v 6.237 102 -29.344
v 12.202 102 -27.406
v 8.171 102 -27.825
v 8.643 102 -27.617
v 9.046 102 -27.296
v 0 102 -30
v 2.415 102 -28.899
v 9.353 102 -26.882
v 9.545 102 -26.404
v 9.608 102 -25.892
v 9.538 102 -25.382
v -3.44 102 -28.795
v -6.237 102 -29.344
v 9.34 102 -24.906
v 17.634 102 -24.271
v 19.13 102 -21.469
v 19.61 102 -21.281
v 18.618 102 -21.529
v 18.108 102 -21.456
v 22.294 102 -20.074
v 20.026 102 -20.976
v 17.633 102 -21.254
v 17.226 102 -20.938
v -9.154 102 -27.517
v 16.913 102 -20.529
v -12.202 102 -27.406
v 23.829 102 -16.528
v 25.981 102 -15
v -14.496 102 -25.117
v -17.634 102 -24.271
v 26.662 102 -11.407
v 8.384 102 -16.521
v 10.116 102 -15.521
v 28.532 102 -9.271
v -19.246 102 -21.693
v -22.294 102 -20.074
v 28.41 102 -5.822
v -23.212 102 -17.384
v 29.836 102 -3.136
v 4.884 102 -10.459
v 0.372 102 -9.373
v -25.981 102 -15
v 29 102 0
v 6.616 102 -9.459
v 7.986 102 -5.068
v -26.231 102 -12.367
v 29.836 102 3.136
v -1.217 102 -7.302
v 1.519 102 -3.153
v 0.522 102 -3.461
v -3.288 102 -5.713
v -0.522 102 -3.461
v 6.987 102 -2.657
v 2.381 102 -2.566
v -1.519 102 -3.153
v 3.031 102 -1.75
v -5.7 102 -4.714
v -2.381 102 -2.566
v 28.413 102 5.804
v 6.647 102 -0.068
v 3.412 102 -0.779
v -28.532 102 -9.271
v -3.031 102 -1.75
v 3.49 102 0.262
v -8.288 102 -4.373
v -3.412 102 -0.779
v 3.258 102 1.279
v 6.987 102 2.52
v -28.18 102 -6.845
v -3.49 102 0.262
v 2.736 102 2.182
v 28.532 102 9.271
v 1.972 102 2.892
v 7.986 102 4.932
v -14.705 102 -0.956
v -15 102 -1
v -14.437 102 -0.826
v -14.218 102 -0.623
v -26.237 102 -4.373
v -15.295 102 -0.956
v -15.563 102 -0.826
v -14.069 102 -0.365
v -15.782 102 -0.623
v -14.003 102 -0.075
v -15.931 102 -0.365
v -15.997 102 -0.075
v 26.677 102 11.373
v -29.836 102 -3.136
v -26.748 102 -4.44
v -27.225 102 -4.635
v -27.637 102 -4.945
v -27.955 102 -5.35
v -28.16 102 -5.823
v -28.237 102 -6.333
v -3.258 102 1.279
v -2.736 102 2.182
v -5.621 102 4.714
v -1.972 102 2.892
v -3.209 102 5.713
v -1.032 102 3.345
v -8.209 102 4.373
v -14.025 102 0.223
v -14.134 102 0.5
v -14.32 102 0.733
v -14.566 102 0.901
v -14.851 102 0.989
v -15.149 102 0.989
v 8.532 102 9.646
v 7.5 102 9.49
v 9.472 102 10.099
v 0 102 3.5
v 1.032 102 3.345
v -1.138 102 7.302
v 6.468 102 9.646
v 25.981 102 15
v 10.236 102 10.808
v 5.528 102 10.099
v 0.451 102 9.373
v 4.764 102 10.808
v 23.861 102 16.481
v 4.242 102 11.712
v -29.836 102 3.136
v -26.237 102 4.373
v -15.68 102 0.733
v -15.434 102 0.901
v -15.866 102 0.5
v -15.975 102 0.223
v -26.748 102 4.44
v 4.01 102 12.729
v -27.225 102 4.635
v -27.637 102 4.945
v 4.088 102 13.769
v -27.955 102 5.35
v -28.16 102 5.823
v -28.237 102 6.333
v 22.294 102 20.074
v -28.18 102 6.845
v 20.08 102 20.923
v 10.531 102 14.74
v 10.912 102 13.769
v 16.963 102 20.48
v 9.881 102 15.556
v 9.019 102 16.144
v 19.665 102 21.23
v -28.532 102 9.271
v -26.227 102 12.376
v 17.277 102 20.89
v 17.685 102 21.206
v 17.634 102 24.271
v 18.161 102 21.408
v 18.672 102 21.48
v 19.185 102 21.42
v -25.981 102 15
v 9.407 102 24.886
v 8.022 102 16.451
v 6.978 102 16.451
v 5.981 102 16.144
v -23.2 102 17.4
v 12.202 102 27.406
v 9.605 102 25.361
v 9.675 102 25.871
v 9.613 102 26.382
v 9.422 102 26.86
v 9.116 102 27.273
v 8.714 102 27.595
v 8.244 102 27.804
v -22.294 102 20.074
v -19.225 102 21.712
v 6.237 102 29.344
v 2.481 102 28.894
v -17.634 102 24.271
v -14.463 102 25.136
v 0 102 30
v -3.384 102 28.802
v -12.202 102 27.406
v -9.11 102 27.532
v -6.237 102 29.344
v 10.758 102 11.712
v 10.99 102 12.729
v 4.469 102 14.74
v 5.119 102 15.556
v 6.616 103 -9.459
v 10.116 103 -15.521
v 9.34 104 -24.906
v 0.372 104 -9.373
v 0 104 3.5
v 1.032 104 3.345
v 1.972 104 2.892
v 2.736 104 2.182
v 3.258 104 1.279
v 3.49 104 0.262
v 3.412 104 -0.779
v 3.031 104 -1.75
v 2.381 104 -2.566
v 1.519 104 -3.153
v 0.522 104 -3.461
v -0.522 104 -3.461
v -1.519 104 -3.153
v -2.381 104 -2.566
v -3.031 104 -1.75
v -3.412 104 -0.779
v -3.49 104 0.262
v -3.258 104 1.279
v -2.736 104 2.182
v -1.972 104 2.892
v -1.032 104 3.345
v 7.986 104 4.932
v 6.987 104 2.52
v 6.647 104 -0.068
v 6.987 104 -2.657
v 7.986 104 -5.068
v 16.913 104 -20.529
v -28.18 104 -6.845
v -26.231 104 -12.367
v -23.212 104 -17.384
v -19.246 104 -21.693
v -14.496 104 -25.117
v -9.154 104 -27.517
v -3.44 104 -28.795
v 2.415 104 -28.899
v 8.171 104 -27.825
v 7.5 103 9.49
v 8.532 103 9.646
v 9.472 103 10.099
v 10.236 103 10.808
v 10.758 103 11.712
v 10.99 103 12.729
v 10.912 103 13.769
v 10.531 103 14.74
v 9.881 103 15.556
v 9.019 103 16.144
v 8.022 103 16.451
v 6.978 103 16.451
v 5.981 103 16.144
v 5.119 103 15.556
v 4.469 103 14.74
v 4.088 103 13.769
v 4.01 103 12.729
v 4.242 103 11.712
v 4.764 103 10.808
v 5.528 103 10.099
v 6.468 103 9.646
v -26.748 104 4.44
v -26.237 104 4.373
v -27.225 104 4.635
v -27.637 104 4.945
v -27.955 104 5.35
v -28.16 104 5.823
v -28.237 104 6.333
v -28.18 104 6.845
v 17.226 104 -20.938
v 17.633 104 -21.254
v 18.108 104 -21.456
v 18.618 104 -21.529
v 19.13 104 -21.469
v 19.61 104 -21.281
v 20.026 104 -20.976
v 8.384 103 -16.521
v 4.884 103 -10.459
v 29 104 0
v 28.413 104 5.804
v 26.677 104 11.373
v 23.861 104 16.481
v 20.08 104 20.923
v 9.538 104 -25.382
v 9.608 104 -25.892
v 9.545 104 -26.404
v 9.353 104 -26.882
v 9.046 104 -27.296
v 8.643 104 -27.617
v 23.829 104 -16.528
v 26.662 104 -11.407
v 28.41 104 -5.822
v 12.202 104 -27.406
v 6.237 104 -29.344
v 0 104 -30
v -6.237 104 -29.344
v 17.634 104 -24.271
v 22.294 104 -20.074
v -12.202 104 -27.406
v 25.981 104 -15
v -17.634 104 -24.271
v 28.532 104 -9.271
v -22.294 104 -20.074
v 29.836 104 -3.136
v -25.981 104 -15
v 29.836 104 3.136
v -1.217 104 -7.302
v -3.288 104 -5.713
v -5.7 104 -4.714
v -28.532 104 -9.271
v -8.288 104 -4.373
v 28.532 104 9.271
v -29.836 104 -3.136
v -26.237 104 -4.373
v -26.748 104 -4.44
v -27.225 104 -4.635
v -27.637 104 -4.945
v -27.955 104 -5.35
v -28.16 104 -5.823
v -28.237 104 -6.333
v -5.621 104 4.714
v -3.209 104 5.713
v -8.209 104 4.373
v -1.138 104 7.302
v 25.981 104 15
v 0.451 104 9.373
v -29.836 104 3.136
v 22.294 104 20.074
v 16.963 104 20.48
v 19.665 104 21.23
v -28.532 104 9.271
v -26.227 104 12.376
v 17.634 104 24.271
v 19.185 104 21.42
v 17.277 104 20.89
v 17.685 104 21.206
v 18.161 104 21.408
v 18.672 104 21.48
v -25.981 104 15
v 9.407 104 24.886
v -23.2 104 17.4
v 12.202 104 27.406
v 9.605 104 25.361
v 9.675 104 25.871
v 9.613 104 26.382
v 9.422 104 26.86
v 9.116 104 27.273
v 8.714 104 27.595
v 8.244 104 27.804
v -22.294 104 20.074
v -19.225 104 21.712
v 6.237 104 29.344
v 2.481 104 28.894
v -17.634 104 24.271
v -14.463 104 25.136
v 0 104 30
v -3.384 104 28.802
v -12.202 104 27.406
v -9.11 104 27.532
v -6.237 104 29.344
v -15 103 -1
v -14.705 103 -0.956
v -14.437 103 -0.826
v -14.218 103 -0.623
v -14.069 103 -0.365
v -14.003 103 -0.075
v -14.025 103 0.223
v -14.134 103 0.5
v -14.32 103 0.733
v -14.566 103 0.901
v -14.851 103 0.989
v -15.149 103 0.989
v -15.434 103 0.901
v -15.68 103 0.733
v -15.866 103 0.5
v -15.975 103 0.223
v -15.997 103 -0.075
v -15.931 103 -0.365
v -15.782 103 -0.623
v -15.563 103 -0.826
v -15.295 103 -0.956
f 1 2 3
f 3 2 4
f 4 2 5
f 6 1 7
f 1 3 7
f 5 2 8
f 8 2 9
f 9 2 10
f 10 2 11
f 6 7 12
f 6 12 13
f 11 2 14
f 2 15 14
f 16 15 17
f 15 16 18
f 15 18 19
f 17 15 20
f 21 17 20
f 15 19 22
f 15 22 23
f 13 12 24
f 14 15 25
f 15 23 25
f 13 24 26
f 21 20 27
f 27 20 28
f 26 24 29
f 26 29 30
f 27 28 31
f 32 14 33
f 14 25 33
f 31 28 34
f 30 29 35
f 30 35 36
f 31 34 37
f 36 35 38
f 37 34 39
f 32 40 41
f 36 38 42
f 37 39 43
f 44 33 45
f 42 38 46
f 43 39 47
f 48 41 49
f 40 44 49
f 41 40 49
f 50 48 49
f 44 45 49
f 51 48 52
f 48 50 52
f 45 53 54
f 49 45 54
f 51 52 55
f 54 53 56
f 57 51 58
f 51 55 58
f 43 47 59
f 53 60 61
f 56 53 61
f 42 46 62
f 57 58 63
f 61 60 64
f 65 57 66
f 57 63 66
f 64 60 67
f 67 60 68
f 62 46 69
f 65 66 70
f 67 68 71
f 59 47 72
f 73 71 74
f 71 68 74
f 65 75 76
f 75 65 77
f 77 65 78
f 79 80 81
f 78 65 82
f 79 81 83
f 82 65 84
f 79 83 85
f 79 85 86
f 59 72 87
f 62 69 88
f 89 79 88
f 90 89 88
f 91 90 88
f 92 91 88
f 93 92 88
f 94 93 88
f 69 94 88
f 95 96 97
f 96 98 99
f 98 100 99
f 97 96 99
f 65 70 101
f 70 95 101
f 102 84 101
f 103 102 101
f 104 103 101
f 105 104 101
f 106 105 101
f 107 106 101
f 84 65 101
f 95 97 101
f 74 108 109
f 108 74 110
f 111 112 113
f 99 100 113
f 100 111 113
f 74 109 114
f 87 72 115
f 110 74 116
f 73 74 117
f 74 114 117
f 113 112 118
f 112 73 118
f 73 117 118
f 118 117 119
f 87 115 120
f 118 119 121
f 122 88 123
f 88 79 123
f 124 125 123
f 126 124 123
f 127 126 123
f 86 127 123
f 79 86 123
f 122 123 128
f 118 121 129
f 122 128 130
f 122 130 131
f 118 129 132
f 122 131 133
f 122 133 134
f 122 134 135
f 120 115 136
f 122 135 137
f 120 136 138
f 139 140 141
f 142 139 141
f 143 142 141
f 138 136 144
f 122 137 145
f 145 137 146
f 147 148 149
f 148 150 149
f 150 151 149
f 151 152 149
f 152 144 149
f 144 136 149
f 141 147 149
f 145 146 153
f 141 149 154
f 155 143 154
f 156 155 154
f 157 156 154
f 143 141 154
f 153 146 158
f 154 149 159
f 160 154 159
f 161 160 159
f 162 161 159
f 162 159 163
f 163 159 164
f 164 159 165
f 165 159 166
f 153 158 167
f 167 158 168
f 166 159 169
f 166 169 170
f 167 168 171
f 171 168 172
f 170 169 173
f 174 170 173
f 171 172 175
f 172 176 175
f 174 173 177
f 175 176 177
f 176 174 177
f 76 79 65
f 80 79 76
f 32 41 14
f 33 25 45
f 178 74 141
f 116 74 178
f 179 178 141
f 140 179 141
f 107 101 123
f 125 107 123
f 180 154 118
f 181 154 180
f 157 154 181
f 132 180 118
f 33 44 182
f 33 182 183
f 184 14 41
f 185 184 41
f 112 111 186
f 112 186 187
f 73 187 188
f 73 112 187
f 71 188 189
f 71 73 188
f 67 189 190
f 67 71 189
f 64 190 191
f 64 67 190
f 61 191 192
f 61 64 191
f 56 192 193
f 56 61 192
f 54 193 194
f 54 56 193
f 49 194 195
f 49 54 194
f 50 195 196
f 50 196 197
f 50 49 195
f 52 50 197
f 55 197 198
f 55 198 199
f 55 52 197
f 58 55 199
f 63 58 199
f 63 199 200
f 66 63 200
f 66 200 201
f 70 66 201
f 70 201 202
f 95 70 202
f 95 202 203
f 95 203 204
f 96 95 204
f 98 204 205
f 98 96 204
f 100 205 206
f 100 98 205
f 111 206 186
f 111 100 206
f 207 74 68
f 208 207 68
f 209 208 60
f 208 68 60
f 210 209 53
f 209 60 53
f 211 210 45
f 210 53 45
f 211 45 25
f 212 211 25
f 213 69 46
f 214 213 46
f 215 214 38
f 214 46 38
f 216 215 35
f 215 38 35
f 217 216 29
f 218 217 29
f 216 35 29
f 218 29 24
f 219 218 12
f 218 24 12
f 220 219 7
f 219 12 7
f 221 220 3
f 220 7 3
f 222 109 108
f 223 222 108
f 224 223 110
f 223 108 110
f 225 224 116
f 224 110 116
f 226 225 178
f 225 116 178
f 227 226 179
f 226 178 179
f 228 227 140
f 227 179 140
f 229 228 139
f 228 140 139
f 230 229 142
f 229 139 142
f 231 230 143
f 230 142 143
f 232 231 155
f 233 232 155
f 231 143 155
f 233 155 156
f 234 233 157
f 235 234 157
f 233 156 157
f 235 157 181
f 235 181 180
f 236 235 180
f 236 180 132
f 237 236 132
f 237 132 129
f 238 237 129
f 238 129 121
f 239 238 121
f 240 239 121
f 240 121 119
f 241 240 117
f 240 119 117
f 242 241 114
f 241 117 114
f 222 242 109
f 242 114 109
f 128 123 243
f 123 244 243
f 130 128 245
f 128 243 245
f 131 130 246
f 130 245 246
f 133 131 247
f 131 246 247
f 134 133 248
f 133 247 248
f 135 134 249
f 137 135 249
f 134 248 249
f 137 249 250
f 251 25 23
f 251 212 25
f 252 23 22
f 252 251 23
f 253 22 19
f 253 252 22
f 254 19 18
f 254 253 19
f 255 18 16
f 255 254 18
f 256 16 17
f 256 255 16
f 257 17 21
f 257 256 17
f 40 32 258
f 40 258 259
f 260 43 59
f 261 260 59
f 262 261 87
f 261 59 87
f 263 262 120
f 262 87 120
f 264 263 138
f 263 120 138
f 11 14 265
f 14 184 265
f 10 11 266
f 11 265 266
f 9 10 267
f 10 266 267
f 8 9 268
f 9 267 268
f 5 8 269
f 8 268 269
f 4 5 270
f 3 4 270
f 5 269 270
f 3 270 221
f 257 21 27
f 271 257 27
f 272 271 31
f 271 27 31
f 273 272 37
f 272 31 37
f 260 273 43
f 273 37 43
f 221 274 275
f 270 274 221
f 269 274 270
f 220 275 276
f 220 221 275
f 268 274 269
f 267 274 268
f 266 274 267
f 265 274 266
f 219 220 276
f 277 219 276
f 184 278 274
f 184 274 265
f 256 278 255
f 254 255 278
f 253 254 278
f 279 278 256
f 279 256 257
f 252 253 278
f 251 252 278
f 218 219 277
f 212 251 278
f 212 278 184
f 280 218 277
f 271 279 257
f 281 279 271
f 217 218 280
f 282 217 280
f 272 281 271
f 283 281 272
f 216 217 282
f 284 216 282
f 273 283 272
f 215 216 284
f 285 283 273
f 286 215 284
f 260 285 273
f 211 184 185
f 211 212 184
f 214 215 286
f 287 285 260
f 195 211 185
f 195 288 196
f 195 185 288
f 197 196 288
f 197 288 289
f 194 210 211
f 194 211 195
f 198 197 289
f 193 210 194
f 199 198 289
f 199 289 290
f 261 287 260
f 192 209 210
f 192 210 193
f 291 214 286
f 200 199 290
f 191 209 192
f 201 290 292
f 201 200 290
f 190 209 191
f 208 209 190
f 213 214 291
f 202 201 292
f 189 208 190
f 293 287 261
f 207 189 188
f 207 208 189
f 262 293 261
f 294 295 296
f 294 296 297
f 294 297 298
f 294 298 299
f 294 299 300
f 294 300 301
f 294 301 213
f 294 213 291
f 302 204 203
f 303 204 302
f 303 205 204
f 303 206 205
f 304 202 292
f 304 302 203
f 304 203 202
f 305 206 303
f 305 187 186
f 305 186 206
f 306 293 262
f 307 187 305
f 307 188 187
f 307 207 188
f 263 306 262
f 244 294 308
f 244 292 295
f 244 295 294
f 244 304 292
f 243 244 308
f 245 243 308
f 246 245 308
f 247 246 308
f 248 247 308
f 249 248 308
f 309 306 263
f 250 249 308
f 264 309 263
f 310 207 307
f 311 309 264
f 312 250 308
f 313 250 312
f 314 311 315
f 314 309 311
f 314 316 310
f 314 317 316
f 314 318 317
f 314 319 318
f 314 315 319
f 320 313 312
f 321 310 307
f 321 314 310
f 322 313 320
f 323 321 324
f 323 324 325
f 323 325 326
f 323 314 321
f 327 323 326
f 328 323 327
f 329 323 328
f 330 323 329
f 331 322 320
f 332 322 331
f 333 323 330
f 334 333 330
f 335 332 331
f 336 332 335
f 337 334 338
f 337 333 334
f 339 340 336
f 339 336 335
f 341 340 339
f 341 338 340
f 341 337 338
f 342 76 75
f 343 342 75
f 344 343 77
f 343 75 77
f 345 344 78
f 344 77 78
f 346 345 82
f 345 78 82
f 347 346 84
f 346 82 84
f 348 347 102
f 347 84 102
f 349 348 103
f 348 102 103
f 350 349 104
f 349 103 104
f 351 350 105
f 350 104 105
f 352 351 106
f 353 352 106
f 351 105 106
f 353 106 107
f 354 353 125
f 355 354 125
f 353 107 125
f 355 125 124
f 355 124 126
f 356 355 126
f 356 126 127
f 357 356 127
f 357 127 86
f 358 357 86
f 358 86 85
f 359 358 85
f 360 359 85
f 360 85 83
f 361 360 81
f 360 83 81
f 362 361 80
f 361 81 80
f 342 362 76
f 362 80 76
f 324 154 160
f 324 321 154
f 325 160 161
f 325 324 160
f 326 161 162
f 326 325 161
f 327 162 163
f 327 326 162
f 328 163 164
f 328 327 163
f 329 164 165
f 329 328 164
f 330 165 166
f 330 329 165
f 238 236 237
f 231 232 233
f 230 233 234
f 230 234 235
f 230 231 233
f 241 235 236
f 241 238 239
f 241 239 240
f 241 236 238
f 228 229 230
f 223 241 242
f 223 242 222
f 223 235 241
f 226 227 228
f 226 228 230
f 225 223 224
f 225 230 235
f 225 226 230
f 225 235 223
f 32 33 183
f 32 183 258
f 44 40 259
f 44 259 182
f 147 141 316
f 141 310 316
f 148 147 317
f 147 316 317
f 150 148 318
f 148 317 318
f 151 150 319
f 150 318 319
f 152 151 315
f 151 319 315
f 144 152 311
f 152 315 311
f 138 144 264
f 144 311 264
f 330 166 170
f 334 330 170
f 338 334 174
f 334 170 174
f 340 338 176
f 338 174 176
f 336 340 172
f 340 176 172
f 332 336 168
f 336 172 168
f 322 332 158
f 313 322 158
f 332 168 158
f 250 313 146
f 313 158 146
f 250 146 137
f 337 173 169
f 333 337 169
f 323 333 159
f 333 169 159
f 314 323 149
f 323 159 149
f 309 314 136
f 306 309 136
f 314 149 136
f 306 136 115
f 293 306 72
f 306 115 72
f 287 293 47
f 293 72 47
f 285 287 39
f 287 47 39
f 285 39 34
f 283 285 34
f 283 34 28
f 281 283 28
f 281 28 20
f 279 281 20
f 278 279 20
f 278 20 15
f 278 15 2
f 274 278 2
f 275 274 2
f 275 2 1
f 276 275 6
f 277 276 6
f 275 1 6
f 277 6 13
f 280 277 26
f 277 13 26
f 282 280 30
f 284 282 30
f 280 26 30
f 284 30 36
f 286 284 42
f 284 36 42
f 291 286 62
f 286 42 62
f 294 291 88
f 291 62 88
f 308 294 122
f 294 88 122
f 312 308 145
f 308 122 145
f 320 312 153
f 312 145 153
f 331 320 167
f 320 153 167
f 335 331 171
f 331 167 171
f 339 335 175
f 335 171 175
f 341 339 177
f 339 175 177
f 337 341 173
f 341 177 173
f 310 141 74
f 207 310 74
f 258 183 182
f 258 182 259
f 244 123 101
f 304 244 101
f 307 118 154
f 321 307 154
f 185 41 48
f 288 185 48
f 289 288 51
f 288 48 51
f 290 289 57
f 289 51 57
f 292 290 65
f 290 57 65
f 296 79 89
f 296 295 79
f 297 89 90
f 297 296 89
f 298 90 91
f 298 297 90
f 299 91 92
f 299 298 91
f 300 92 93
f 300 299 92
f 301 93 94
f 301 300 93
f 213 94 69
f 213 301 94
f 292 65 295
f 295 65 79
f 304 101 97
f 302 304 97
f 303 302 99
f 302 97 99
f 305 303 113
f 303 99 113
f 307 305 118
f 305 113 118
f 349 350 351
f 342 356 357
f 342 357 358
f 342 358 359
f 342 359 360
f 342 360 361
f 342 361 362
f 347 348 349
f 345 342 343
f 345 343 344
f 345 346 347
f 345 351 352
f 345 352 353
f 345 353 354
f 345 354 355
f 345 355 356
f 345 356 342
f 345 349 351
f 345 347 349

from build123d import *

# Parameters (mm, degrees)
SKETCH1_R           = 46.5
SKETCH1_R_2         = 6.5
SKETCH1_R_3         = 10
SKETCH1_R_4         = 3.5
BOSS_EXTRUDE1_DEPTH = 2
SKETCH3_R           = 5
SKETCH3_R_2         = 3.5
BOSS_EXTRUDE2_DEPTH = 100
SKETCH4_R           = 30
SKETCH4_R_2         = 5
SKETCH4_R_3         = 3.5
BOSS_EXTRUDE5_DEPTH = 2
FILLET2_R           = 2
SKETCH5_R           = 1
SKETCH5_R_2         = 3.5
CUT_EXTRUDE1_DEPTH  = 1
SKETCH6_R           = 2
CUT_EXTRUDE2_DEPTH  = 2
CHAMFER2_SIZE       = 0.8
SKETCH7_R           = 61.085714235
CUT_EXTRUDE3_DEPTH  = 122.361031637


with BuildPart() as part:
    # Sketch1 → Boss-Extrude1 (new body)
    with BuildSketch(Plane(origin=(0, 0, 0), x_dir=(1, 0, 0), z_dir=(0, 1, 0))):
        with Locations(Location((0, 0, 0), (0, 0, 270))):
            Circle(SKETCH1_R)
        with Locations(Location((0, 15, 0), (0, 0, 270))):
            Circle(SKETCH1_R_2, mode=Mode.SUBTRACT)
        with Locations(Location((-12.990381057, -7.5, 0), (0, 0, 270))):
            Circle(SKETCH1_R_3, mode=Mode.SUBTRACT)
        with Locations(Location((12.990381057, -7.5, 0), (0, 0, 270))):
            Circle(SKETCH1_R_4, mode=Mode.SUBTRACT)
        with Locations(Location((0, 0, 0), (0, 0, 270))):
            Circle(SKETCH1_R_4, mode=Mode.SUBTRACT)
    extrude(amount=BOSS_EXTRUDE1_DEPTH)

    # Sketch3 → Boss-Extrude2 (add)
    with BuildSketch(Plane(origin=(0, 2, 0), x_dir=(1, 0, 0), z_dir=(0, 1, 0))):
        with Locations(Location((0, 0, 0), (0, 0, 210))):
            Circle(SKETCH3_R)
        with Locations(Location((0, 0, 0), (0, 0, 270))):
            Circle(SKETCH3_R_2, mode=Mode.SUBTRACT)
    extrude(amount=BOSS_EXTRUDE2_DEPTH)

    # Sketch6 → Cut-Extrude2 (cut)
    with BuildSketch(Plane.XZ):
        with Locations(Location((0, 35, 0), (0, 0, 270))):
            Circle(SKETCH6_R)
        with Locations(Location((27.364101886, 21.822143065, 0), (0, 0, 270))):
            Circle(SKETCH6_R)
        with Locations(Location((34.122476926, -7.788232688, 0), (0, 0, 270))):
            Circle(SKETCH6_R)
        with Locations(Location((15.185930869, -31.533910377, 0), (0, 0, 270))):
            Circle(SKETCH6_R)
        with Locations(Location((-15.185930869, -31.533910377, 0), (0, 0, 270))):
            Circle(SKETCH6_R)
        with Locations(Location((-34.122476926, -7.788232688, 0), (0, 0, 270))):
            Circle(SKETCH6_R)
        with Locations(Location((-27.364101886, 21.822143065, 0), (0, 0, 270))):
            Circle(SKETCH6_R)
    extrude(amount=-CUT_EXTRUDE2_DEPTH, mode=Mode.SUBTRACT)

    # Chamfer2
    chamfer2_edges = [part.edges().sort_by_distance(p)[0] for p in [
        (12.990381057, 0, 4),
        (34.122476926, 0, -5.788232688),
        (27.364101886, 0, 23.822143065),
        (0, 0, 37),
        (-27.364101886, 0, 23.822143065),
        (-34.122476926, 0, -5.788232688),
        (-15.185930869, 0, -29.533910377),
        (15.185930869, 0, -29.533910377),
    ]]
    chamfer(chamfer2_edges, length=CHAMFER2_SIZE)

    # Sketch7 → Cut-Extrude3 (cut, through all)
    with BuildSketch(Plane.XZ.offset(-102)):
        Circle(SKETCH7_R)
    extrude(amount=CUT_EXTRUDE3_DEPTH, mode=Mode.SUBTRACT)


with BuildPart() as body_2:
    # Sketch4 → Boss-Extrude5 (new body)
    # profile 1 of 3: a face of its own
    with BuildSketch(Plane(origin=(0, 102, 0), x_dir=(1, 0, 0), z_dir=(0, 1, 0))):
        with Locations(Location((0, 0, 0), (0, 0, 270))):
            Circle(SKETCH4_R)
        with BuildLine():
            ThreePointArc((-28.668345883, -4.373321886), (-29, 0), (-28.668345883, 4.373321886))
            ThreePointArc((-28.668345883, 4.373321886), (-14.496121896, 25.116975335), (10.555107028, 27.010918452))
            ThreePointArc((10.555107028, 27.010918452), (14.507755353, 25.110257558), (18.128572143, 22.635257278))
            ThreePointArc((18.128572143, 22.635257278), (26.141237463, 12.555305808), (29, 0))
            ThreePointArc((29, 0), (26.156181805, -12.524142821), (18.182472179, -22.591983212))
            ThreePointArc((18.182472179, -22.591983212), (14.567551204, -25.075614687), (10.619428606, -26.985695027))
            ThreePointArc((10.619428606, -26.985695027), (-14.466191914, -25.134225501), (-28.668345883, -4.373321886))
        make_face(mode=Mode.SUBTRACT)
    # profile 2 of 3: a face of its own
    with BuildSketch(Plane(origin=(0, 102, 0), x_dir=(1, 0, 0), z_dir=(0, 1, 0))):
        with BuildLine():
            ThreePointArc((0.372035902, 9.373321886), (-3.288218135, 5.713067848), (-8.288218135, 4.373321886))
            Line((-8.288218135, 4.373321886), (-28.668345883, 4.373321886))
            ThreePointArc((-28.668345883, 4.373321886), (-29, 0), (-28.668345883, -4.373321886))
            Line((-28.668345883, -4.373321886), (-8.209333805, -4.373321886))
            ThreePointArc((-8.209333805, -4.373321886), (-3.209333805, -5.713067848), (0.450920232, -9.373321886))
            Line((0.450920232, -9.373321886), (10.619428606, -26.985695027))
            ThreePointArc((10.619428606, -26.985695027), (14.567551204, -25.075614687), (18.182472179, -22.591983212))
            Line((18.182472179, -22.591983212), (7.986293771, -4.931684166))
            ThreePointArc((7.986293771, -4.931684166), (6.646547809, 0.068315834), (7.986293771, 5.068315834))
            Line((7.986293771, 5.068315834), (18.128572143, 22.635257278))
            ThreePointArc((18.128572143, 22.635257278), (14.507755353, 25.110257558), (10.555107028, 27.010918452))
            Line((10.555107028, 27.010918452), (0.372035902, 9.373321886))
        make_face()
        with Locations(Location((0, 0, 0), (0, 0, 210))):
            Circle(SKETCH4_R_2, mode=Mode.SUBTRACT)
    # profile 3 of 3: a face of its own
    with BuildSketch(Plane(origin=(0, 102, 0), x_dir=(1, 0, 0), z_dir=(0, 1, 0))):
        with Locations(Location((0, 0, 0), (0, 0, 210))):
            Circle(SKETCH4_R_2)
        with Locations(Location((0, 0, 0), (0, 0, 270))):
            Circle(SKETCH4_R_3, mode=Mode.SUBTRACT)
    extrude(amount=BOSS_EXTRUDE5_DEPTH)

    # Fillet2
    fillet2_edges = [body_2.edges().sort_by_distance(p)[0] for p in [
        (10.555107028, 103, -27.010918452),
        (-28.668345883, 103, -4.373321886),
        (18.128572143, 103, -22.635257278),
        (18.182472179, 103, 22.591983212),
        (10.619428606, 103, 26.985695027),
        (-28.668345883, 103, 4.373321886),
    ]]
    fillet(fillet2_edges, radius=FILLET2_R)

    # Sketch5 → Cut-Extrude1 (cut)
    with BuildSketch(Plane.XZ.offset(-102)):
        with Locations(Location((-15, 0, 0), (0, 0, 270))):
            Circle(SKETCH5_R)
        with Locations(Location((7.5, 12.990381057, 0), (0, 0, 270))):
            Circle(SKETCH5_R_2)
        Polygon((8.383974596, -16.52146997), (4.883974596, -10.459292144), (6.616025404, -9.459292144), (10.116025404, -15.52146997), align=None)
    extrude(amount=-CUT_EXTRUDE1_DEPTH, mode=Mode.SUBTRACT)


solid = body_2.part
